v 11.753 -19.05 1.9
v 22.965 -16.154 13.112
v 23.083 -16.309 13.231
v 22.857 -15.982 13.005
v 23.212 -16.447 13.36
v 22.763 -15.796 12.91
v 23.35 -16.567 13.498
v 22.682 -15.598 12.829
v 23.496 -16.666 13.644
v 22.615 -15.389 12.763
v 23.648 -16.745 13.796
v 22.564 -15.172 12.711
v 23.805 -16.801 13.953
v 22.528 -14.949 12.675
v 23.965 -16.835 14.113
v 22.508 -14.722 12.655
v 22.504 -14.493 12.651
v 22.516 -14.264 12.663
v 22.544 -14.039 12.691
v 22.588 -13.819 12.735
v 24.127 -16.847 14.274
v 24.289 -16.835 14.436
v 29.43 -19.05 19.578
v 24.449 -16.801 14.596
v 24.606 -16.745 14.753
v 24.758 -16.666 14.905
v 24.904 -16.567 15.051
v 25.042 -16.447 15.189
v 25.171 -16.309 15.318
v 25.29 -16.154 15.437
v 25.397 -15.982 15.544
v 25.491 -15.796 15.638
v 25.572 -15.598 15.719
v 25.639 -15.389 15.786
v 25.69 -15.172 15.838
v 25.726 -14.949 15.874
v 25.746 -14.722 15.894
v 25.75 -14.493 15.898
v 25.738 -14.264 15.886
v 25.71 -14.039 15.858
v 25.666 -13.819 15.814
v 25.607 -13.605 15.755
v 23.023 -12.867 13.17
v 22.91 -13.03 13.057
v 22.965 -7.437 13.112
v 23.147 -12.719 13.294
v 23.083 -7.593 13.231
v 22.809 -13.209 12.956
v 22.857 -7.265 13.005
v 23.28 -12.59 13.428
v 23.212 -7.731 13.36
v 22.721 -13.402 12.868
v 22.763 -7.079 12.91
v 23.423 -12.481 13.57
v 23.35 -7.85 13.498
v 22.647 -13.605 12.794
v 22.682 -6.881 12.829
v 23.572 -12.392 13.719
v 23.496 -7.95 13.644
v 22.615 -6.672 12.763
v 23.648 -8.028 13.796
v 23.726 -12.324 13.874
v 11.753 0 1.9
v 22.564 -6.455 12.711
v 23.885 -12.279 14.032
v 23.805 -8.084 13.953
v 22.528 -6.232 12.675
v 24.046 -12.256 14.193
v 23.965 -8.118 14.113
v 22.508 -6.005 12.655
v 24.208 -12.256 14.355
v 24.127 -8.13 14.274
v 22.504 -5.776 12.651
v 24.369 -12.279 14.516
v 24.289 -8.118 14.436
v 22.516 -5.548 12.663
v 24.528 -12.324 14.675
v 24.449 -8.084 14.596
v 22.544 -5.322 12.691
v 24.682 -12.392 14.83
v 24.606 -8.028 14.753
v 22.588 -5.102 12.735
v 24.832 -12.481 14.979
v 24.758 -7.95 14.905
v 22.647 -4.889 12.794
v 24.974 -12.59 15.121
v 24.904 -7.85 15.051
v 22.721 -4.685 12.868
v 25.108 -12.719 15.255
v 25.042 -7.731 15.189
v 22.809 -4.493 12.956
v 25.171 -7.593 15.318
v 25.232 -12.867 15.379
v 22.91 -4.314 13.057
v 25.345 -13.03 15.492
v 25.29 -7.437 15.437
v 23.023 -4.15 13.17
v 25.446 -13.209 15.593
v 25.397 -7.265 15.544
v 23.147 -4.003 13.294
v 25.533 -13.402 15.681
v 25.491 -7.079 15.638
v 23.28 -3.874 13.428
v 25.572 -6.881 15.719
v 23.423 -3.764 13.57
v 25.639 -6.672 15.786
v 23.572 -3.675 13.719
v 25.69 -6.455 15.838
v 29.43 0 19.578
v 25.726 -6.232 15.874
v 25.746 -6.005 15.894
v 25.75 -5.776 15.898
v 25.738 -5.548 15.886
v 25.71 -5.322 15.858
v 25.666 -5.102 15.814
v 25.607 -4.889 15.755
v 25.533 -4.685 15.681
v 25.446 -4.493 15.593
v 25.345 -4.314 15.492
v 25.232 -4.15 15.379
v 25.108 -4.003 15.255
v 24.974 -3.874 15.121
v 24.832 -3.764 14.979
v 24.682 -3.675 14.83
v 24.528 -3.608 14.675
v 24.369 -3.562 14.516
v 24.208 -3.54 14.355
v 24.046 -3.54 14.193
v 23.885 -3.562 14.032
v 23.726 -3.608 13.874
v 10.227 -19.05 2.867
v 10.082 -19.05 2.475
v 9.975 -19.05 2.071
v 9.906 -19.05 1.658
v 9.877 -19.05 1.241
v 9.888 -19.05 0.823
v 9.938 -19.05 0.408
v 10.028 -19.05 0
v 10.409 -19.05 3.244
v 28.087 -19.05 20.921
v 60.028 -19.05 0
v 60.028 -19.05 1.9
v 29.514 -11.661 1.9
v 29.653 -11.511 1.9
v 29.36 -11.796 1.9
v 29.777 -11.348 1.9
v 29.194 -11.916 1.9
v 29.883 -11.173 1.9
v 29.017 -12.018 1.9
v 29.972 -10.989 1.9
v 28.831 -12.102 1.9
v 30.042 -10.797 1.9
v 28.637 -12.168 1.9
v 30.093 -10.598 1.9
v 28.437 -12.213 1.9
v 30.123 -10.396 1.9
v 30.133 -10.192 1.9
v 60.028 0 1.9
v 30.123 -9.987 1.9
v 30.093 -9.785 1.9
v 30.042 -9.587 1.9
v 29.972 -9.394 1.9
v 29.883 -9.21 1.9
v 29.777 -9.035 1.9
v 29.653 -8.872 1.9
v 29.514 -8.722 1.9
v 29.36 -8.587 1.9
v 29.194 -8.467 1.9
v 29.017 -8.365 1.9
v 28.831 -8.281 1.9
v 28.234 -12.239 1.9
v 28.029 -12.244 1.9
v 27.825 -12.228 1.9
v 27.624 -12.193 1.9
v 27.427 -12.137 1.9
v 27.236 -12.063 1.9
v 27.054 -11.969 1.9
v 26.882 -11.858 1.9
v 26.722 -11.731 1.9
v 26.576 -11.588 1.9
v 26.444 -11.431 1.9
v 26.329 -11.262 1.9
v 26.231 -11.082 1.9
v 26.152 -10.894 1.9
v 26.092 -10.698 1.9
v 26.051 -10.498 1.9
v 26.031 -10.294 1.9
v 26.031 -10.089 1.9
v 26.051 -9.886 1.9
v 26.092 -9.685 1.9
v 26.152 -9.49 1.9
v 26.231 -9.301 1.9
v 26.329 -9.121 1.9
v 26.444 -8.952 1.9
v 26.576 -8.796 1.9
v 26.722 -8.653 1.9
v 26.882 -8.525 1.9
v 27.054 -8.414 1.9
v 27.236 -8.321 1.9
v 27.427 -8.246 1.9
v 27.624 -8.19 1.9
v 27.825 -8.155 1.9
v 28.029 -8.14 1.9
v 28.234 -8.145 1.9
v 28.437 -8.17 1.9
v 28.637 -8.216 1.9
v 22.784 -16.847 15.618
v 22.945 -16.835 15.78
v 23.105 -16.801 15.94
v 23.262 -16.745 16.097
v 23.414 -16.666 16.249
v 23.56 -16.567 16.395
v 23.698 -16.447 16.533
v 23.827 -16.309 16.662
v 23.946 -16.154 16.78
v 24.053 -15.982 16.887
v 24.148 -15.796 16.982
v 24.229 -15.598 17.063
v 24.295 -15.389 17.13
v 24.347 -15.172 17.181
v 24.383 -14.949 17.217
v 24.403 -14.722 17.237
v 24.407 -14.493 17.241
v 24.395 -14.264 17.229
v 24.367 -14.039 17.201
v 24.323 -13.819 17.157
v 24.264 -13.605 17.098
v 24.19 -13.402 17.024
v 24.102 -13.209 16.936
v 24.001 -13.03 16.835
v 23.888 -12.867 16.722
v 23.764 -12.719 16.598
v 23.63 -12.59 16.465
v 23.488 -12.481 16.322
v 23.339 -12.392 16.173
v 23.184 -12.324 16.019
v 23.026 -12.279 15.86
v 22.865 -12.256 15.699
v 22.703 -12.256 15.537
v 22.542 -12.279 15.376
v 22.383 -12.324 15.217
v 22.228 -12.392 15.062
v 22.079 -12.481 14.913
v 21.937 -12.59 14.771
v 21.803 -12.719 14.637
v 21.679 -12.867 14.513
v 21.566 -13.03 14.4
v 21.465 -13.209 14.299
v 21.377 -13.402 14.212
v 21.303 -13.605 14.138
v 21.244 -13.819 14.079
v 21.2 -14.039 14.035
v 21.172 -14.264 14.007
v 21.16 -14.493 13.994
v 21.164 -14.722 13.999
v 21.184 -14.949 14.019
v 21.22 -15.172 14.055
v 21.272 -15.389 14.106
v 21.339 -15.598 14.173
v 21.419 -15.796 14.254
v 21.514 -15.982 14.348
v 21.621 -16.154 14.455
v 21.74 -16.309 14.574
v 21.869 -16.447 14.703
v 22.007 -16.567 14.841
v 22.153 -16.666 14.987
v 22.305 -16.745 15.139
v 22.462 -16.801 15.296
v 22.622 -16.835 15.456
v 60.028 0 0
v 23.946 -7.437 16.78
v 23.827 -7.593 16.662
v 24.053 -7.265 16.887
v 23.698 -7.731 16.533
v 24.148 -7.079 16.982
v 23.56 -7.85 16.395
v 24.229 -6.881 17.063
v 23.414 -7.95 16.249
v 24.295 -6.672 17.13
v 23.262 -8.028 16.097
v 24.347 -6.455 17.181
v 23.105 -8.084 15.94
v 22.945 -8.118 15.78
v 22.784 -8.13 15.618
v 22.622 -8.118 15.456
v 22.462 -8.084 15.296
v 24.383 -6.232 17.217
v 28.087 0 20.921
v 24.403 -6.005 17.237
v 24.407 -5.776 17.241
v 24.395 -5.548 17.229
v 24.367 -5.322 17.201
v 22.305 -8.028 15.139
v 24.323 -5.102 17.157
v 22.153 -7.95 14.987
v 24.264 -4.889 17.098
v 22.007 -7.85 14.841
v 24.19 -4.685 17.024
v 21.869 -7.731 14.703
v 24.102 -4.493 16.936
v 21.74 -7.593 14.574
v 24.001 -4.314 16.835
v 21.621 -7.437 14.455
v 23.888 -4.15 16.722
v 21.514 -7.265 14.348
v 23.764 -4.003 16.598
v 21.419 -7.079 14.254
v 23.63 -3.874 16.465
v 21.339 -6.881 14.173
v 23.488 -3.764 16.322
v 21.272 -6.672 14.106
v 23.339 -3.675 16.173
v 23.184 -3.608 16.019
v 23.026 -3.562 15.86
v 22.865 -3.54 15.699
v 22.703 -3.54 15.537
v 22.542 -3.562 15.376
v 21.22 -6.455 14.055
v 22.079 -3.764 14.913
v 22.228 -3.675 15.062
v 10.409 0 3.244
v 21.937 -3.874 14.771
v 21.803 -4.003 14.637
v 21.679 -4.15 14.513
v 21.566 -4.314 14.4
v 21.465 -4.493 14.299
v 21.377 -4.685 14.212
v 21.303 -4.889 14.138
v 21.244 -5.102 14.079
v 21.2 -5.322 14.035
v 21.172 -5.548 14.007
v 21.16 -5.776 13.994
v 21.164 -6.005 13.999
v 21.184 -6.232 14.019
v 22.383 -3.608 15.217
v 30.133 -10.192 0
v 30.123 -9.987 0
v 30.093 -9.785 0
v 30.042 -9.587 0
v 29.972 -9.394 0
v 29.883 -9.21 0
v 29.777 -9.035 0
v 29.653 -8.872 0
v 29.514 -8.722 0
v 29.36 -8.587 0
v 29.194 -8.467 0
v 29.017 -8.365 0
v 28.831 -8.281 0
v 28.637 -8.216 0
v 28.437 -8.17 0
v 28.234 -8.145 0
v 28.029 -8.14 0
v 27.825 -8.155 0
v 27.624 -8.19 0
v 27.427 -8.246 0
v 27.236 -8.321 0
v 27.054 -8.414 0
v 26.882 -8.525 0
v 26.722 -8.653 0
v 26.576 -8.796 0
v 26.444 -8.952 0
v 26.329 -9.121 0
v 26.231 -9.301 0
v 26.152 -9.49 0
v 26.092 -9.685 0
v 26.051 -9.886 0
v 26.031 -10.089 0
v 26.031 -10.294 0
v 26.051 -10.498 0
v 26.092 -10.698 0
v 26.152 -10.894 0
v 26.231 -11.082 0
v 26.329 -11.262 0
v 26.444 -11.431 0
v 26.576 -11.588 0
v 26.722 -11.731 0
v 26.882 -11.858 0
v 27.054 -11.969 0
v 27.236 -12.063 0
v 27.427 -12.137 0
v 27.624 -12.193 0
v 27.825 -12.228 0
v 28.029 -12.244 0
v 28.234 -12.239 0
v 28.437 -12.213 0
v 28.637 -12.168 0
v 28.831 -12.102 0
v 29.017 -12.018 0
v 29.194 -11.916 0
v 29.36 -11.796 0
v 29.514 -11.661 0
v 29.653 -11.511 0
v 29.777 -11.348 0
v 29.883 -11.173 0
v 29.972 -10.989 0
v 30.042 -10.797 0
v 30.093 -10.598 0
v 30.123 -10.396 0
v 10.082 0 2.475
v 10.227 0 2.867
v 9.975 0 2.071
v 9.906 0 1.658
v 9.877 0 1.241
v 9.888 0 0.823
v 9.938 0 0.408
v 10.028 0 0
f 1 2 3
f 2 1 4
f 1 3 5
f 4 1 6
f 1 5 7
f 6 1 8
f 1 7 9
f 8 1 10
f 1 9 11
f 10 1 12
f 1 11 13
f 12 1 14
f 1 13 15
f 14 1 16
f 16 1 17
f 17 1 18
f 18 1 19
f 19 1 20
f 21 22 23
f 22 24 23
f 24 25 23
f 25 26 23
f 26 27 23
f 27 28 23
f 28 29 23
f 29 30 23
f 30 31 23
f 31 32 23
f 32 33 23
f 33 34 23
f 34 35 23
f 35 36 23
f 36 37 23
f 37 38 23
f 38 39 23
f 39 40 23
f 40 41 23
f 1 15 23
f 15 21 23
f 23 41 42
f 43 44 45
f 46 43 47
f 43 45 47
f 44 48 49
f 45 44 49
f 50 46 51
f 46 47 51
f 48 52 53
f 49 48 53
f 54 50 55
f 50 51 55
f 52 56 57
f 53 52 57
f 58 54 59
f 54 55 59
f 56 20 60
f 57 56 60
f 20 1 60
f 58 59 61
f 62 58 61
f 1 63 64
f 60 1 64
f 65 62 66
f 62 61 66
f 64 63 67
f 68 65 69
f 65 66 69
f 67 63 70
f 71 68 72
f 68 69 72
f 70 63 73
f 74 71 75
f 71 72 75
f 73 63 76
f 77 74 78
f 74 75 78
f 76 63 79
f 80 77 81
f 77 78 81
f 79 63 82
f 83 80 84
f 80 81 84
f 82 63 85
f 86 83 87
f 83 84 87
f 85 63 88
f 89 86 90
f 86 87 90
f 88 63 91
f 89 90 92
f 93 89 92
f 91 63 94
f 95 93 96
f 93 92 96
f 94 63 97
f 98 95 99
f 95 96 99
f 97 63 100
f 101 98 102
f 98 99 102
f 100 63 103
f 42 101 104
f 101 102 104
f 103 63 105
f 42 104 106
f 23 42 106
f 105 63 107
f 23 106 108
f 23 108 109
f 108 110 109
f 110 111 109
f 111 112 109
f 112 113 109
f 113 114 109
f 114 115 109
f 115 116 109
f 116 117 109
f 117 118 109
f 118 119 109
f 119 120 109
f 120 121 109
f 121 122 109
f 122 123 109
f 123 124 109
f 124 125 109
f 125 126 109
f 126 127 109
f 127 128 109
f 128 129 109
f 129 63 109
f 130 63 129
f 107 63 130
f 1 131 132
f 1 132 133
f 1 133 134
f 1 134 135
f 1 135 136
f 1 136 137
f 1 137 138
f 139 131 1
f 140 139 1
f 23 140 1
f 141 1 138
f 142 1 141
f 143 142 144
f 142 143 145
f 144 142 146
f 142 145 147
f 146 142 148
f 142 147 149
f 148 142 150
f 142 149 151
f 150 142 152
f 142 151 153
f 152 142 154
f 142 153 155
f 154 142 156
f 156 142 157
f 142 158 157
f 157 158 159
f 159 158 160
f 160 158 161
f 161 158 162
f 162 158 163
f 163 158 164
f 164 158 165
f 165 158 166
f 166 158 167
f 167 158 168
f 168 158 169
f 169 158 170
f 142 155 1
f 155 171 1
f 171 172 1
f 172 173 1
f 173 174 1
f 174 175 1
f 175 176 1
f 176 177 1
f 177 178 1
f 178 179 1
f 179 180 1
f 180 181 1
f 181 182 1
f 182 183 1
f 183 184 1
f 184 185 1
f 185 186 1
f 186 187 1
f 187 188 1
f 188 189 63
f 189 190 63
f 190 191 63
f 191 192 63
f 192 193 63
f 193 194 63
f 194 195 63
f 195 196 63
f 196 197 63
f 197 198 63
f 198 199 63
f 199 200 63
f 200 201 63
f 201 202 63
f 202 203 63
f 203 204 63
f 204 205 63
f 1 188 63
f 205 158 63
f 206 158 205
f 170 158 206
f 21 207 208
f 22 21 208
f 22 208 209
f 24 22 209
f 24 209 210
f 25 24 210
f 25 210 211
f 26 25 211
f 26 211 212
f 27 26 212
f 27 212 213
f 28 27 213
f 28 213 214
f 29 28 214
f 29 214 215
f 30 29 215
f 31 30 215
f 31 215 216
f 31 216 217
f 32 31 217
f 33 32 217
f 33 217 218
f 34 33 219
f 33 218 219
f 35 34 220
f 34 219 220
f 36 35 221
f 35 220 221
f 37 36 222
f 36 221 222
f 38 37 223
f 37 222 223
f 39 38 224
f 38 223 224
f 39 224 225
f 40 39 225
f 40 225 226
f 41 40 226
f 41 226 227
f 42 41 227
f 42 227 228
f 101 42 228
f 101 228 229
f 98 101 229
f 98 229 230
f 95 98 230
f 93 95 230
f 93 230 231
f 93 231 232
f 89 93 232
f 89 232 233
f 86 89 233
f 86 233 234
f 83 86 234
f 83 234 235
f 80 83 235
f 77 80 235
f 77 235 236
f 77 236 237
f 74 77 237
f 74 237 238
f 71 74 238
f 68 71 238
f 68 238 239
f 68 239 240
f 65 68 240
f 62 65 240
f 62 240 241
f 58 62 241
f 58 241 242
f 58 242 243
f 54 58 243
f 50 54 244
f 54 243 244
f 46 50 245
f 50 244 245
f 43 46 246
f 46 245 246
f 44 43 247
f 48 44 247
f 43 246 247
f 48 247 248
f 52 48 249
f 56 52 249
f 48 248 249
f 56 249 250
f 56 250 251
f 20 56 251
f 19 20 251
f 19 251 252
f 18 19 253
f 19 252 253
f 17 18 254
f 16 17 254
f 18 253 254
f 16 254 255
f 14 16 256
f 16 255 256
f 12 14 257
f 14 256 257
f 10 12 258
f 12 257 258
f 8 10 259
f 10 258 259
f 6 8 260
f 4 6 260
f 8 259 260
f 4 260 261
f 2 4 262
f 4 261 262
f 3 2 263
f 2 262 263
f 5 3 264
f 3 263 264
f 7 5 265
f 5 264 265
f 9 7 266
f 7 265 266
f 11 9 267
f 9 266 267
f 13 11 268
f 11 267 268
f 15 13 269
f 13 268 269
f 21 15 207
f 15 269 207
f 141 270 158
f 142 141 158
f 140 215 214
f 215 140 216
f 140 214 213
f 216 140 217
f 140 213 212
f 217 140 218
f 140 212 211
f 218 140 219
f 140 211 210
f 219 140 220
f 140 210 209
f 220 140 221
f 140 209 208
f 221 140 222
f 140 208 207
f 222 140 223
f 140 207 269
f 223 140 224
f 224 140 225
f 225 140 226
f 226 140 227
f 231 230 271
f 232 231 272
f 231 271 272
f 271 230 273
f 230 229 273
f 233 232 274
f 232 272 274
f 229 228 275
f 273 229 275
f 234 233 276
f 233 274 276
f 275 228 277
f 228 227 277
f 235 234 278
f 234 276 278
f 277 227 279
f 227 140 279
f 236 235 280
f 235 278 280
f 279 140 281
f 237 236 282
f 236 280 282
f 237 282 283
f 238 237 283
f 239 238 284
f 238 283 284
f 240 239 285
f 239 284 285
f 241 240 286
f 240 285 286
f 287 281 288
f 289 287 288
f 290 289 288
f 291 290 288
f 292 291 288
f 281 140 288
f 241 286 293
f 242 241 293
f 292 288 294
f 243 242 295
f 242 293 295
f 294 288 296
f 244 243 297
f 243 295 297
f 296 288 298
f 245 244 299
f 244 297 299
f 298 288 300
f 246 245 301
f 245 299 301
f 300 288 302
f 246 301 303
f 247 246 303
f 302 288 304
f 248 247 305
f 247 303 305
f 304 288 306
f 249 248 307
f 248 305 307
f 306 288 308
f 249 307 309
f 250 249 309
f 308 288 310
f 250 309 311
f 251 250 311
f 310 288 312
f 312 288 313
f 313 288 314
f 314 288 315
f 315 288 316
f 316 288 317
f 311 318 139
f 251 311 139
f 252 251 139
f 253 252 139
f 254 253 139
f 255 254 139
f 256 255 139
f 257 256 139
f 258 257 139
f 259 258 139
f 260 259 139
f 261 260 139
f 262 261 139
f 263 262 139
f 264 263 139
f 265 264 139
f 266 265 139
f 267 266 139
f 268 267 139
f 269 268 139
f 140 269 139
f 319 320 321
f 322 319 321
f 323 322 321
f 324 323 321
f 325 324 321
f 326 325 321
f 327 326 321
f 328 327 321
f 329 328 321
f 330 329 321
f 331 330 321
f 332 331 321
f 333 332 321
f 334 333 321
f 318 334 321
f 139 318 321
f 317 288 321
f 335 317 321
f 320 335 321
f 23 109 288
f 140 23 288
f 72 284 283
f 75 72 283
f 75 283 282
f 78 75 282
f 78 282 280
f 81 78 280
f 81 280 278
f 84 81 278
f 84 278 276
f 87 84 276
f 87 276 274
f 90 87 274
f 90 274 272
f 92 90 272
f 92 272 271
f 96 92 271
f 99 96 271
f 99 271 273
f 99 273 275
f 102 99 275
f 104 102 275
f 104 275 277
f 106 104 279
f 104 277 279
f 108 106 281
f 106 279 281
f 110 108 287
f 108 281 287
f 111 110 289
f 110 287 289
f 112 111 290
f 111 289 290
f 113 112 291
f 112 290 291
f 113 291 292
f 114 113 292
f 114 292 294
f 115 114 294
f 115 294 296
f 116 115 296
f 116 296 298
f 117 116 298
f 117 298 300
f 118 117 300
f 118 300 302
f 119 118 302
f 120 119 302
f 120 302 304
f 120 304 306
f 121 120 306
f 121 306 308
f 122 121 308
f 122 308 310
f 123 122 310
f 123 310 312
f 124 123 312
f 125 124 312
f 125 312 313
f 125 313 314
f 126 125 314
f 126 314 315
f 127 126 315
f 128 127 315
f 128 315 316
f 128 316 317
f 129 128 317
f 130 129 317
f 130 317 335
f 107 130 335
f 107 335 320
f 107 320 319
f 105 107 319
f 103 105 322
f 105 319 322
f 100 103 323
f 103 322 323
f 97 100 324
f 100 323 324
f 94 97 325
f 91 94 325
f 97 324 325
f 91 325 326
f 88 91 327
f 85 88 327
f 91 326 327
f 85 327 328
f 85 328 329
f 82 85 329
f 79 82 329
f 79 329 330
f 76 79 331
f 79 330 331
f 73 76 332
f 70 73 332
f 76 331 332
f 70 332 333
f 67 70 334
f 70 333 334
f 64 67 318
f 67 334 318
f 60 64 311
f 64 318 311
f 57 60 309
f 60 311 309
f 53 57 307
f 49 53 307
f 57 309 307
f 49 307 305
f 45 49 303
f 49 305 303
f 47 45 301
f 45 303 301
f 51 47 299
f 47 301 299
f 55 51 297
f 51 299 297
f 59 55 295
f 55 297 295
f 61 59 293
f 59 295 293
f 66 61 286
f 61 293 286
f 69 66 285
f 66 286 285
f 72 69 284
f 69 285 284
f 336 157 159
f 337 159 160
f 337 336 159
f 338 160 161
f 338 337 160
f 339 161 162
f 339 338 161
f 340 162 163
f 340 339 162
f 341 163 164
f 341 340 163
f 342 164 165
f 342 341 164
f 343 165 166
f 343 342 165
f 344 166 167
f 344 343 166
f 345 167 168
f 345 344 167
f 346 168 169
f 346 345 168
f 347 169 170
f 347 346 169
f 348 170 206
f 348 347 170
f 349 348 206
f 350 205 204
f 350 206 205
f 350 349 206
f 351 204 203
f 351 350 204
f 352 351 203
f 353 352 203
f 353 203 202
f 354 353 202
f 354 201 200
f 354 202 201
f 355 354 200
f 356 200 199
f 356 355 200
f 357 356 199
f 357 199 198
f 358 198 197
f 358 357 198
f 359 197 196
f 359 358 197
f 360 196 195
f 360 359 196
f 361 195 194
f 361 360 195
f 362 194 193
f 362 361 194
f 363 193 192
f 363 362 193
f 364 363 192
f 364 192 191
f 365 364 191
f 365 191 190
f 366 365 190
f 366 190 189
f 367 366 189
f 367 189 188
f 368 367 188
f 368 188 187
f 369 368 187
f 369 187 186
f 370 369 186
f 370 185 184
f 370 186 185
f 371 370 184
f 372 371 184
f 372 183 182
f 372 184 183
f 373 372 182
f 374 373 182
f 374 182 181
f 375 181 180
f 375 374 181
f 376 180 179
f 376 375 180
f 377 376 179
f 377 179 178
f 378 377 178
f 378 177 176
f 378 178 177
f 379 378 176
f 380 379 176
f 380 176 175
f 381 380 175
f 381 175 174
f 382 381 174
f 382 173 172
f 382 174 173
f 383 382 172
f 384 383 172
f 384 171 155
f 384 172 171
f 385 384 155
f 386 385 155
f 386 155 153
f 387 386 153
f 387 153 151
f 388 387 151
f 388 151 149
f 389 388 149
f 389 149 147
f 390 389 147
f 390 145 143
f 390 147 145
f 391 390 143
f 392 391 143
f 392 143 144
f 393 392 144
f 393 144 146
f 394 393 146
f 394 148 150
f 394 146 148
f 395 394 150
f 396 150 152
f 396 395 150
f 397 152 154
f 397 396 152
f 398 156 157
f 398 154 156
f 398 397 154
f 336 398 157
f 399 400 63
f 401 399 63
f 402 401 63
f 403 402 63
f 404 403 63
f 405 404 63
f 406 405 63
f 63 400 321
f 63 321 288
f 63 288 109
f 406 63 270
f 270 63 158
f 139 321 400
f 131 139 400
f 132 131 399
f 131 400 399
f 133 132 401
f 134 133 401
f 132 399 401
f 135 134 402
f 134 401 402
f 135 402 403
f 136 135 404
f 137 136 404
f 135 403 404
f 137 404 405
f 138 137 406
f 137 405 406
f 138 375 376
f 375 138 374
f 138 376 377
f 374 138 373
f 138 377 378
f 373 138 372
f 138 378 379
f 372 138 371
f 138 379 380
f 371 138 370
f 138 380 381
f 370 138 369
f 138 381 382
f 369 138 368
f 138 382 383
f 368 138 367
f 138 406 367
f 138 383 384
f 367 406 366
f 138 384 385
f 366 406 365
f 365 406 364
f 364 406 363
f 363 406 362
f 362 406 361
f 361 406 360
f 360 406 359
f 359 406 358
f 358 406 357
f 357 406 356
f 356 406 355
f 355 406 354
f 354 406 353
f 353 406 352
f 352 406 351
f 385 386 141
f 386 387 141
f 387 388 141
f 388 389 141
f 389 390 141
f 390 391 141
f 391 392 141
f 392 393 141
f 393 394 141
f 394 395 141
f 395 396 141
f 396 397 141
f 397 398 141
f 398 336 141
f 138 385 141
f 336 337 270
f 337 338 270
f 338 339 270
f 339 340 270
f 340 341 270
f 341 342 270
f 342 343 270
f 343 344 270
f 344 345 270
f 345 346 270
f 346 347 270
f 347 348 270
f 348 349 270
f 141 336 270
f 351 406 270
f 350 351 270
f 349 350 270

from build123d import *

# Parameters (mm, degrees)
F1_DEPTH = 19.05
F3_R     = 2.29653
F4_DEPTH = 5.588
F2_R     = 2.052631
F5_DEPTH = 5.842


with BuildPart() as f1:
    # F0 (on Front) → F1 (new body)
    with BuildSketch(Plane.XZ):
        with BuildLine():
            Line((60.027805, 1.9), (11.752726, 1.9))
            Line((11.752726, 1.9), (29.430396, 19.57767))
            Line((29.430396, 19.57767), (28.086893, 20.921172))
            Line((28.086893, 20.921172), (10.409223, 3.243503))
            ThreePointArc((10.409223, 3.243503), (9.906439, 1.65845), (10.027805, 0))
            Line((10.027805, 0), (60.027805, 0))
            Line((60.027805, 0), (60.027805, 1.9))
        make_face()
    extrude(amount=F1_DEPTH)

    # F3 (on face) → F4 (cut)
    with BuildSketch(Plane(origin=(3.58286, 0, -3.58286), x_dir=(0, -1, 0), z_dir=(-0.707107, 0, 0.707107))):
        with Locations((14.55, 27.153935)):
            Circle(F3_R)
        with Locations((5.83333, 27.153935)):
            Circle(F3_R)
    extrude(amount=-F4_DEPTH, mode=Mode.SUBTRACT)

    # F2 (on Top) → F5 (cut)
    with BuildSketch(Plane.XY):
        with Locations((28.080662, -10.191665)):
            Circle(F2_R)
    extrude(amount=F5_DEPTH, mode=Mode.SUBTRACT)


solid = f1.part
